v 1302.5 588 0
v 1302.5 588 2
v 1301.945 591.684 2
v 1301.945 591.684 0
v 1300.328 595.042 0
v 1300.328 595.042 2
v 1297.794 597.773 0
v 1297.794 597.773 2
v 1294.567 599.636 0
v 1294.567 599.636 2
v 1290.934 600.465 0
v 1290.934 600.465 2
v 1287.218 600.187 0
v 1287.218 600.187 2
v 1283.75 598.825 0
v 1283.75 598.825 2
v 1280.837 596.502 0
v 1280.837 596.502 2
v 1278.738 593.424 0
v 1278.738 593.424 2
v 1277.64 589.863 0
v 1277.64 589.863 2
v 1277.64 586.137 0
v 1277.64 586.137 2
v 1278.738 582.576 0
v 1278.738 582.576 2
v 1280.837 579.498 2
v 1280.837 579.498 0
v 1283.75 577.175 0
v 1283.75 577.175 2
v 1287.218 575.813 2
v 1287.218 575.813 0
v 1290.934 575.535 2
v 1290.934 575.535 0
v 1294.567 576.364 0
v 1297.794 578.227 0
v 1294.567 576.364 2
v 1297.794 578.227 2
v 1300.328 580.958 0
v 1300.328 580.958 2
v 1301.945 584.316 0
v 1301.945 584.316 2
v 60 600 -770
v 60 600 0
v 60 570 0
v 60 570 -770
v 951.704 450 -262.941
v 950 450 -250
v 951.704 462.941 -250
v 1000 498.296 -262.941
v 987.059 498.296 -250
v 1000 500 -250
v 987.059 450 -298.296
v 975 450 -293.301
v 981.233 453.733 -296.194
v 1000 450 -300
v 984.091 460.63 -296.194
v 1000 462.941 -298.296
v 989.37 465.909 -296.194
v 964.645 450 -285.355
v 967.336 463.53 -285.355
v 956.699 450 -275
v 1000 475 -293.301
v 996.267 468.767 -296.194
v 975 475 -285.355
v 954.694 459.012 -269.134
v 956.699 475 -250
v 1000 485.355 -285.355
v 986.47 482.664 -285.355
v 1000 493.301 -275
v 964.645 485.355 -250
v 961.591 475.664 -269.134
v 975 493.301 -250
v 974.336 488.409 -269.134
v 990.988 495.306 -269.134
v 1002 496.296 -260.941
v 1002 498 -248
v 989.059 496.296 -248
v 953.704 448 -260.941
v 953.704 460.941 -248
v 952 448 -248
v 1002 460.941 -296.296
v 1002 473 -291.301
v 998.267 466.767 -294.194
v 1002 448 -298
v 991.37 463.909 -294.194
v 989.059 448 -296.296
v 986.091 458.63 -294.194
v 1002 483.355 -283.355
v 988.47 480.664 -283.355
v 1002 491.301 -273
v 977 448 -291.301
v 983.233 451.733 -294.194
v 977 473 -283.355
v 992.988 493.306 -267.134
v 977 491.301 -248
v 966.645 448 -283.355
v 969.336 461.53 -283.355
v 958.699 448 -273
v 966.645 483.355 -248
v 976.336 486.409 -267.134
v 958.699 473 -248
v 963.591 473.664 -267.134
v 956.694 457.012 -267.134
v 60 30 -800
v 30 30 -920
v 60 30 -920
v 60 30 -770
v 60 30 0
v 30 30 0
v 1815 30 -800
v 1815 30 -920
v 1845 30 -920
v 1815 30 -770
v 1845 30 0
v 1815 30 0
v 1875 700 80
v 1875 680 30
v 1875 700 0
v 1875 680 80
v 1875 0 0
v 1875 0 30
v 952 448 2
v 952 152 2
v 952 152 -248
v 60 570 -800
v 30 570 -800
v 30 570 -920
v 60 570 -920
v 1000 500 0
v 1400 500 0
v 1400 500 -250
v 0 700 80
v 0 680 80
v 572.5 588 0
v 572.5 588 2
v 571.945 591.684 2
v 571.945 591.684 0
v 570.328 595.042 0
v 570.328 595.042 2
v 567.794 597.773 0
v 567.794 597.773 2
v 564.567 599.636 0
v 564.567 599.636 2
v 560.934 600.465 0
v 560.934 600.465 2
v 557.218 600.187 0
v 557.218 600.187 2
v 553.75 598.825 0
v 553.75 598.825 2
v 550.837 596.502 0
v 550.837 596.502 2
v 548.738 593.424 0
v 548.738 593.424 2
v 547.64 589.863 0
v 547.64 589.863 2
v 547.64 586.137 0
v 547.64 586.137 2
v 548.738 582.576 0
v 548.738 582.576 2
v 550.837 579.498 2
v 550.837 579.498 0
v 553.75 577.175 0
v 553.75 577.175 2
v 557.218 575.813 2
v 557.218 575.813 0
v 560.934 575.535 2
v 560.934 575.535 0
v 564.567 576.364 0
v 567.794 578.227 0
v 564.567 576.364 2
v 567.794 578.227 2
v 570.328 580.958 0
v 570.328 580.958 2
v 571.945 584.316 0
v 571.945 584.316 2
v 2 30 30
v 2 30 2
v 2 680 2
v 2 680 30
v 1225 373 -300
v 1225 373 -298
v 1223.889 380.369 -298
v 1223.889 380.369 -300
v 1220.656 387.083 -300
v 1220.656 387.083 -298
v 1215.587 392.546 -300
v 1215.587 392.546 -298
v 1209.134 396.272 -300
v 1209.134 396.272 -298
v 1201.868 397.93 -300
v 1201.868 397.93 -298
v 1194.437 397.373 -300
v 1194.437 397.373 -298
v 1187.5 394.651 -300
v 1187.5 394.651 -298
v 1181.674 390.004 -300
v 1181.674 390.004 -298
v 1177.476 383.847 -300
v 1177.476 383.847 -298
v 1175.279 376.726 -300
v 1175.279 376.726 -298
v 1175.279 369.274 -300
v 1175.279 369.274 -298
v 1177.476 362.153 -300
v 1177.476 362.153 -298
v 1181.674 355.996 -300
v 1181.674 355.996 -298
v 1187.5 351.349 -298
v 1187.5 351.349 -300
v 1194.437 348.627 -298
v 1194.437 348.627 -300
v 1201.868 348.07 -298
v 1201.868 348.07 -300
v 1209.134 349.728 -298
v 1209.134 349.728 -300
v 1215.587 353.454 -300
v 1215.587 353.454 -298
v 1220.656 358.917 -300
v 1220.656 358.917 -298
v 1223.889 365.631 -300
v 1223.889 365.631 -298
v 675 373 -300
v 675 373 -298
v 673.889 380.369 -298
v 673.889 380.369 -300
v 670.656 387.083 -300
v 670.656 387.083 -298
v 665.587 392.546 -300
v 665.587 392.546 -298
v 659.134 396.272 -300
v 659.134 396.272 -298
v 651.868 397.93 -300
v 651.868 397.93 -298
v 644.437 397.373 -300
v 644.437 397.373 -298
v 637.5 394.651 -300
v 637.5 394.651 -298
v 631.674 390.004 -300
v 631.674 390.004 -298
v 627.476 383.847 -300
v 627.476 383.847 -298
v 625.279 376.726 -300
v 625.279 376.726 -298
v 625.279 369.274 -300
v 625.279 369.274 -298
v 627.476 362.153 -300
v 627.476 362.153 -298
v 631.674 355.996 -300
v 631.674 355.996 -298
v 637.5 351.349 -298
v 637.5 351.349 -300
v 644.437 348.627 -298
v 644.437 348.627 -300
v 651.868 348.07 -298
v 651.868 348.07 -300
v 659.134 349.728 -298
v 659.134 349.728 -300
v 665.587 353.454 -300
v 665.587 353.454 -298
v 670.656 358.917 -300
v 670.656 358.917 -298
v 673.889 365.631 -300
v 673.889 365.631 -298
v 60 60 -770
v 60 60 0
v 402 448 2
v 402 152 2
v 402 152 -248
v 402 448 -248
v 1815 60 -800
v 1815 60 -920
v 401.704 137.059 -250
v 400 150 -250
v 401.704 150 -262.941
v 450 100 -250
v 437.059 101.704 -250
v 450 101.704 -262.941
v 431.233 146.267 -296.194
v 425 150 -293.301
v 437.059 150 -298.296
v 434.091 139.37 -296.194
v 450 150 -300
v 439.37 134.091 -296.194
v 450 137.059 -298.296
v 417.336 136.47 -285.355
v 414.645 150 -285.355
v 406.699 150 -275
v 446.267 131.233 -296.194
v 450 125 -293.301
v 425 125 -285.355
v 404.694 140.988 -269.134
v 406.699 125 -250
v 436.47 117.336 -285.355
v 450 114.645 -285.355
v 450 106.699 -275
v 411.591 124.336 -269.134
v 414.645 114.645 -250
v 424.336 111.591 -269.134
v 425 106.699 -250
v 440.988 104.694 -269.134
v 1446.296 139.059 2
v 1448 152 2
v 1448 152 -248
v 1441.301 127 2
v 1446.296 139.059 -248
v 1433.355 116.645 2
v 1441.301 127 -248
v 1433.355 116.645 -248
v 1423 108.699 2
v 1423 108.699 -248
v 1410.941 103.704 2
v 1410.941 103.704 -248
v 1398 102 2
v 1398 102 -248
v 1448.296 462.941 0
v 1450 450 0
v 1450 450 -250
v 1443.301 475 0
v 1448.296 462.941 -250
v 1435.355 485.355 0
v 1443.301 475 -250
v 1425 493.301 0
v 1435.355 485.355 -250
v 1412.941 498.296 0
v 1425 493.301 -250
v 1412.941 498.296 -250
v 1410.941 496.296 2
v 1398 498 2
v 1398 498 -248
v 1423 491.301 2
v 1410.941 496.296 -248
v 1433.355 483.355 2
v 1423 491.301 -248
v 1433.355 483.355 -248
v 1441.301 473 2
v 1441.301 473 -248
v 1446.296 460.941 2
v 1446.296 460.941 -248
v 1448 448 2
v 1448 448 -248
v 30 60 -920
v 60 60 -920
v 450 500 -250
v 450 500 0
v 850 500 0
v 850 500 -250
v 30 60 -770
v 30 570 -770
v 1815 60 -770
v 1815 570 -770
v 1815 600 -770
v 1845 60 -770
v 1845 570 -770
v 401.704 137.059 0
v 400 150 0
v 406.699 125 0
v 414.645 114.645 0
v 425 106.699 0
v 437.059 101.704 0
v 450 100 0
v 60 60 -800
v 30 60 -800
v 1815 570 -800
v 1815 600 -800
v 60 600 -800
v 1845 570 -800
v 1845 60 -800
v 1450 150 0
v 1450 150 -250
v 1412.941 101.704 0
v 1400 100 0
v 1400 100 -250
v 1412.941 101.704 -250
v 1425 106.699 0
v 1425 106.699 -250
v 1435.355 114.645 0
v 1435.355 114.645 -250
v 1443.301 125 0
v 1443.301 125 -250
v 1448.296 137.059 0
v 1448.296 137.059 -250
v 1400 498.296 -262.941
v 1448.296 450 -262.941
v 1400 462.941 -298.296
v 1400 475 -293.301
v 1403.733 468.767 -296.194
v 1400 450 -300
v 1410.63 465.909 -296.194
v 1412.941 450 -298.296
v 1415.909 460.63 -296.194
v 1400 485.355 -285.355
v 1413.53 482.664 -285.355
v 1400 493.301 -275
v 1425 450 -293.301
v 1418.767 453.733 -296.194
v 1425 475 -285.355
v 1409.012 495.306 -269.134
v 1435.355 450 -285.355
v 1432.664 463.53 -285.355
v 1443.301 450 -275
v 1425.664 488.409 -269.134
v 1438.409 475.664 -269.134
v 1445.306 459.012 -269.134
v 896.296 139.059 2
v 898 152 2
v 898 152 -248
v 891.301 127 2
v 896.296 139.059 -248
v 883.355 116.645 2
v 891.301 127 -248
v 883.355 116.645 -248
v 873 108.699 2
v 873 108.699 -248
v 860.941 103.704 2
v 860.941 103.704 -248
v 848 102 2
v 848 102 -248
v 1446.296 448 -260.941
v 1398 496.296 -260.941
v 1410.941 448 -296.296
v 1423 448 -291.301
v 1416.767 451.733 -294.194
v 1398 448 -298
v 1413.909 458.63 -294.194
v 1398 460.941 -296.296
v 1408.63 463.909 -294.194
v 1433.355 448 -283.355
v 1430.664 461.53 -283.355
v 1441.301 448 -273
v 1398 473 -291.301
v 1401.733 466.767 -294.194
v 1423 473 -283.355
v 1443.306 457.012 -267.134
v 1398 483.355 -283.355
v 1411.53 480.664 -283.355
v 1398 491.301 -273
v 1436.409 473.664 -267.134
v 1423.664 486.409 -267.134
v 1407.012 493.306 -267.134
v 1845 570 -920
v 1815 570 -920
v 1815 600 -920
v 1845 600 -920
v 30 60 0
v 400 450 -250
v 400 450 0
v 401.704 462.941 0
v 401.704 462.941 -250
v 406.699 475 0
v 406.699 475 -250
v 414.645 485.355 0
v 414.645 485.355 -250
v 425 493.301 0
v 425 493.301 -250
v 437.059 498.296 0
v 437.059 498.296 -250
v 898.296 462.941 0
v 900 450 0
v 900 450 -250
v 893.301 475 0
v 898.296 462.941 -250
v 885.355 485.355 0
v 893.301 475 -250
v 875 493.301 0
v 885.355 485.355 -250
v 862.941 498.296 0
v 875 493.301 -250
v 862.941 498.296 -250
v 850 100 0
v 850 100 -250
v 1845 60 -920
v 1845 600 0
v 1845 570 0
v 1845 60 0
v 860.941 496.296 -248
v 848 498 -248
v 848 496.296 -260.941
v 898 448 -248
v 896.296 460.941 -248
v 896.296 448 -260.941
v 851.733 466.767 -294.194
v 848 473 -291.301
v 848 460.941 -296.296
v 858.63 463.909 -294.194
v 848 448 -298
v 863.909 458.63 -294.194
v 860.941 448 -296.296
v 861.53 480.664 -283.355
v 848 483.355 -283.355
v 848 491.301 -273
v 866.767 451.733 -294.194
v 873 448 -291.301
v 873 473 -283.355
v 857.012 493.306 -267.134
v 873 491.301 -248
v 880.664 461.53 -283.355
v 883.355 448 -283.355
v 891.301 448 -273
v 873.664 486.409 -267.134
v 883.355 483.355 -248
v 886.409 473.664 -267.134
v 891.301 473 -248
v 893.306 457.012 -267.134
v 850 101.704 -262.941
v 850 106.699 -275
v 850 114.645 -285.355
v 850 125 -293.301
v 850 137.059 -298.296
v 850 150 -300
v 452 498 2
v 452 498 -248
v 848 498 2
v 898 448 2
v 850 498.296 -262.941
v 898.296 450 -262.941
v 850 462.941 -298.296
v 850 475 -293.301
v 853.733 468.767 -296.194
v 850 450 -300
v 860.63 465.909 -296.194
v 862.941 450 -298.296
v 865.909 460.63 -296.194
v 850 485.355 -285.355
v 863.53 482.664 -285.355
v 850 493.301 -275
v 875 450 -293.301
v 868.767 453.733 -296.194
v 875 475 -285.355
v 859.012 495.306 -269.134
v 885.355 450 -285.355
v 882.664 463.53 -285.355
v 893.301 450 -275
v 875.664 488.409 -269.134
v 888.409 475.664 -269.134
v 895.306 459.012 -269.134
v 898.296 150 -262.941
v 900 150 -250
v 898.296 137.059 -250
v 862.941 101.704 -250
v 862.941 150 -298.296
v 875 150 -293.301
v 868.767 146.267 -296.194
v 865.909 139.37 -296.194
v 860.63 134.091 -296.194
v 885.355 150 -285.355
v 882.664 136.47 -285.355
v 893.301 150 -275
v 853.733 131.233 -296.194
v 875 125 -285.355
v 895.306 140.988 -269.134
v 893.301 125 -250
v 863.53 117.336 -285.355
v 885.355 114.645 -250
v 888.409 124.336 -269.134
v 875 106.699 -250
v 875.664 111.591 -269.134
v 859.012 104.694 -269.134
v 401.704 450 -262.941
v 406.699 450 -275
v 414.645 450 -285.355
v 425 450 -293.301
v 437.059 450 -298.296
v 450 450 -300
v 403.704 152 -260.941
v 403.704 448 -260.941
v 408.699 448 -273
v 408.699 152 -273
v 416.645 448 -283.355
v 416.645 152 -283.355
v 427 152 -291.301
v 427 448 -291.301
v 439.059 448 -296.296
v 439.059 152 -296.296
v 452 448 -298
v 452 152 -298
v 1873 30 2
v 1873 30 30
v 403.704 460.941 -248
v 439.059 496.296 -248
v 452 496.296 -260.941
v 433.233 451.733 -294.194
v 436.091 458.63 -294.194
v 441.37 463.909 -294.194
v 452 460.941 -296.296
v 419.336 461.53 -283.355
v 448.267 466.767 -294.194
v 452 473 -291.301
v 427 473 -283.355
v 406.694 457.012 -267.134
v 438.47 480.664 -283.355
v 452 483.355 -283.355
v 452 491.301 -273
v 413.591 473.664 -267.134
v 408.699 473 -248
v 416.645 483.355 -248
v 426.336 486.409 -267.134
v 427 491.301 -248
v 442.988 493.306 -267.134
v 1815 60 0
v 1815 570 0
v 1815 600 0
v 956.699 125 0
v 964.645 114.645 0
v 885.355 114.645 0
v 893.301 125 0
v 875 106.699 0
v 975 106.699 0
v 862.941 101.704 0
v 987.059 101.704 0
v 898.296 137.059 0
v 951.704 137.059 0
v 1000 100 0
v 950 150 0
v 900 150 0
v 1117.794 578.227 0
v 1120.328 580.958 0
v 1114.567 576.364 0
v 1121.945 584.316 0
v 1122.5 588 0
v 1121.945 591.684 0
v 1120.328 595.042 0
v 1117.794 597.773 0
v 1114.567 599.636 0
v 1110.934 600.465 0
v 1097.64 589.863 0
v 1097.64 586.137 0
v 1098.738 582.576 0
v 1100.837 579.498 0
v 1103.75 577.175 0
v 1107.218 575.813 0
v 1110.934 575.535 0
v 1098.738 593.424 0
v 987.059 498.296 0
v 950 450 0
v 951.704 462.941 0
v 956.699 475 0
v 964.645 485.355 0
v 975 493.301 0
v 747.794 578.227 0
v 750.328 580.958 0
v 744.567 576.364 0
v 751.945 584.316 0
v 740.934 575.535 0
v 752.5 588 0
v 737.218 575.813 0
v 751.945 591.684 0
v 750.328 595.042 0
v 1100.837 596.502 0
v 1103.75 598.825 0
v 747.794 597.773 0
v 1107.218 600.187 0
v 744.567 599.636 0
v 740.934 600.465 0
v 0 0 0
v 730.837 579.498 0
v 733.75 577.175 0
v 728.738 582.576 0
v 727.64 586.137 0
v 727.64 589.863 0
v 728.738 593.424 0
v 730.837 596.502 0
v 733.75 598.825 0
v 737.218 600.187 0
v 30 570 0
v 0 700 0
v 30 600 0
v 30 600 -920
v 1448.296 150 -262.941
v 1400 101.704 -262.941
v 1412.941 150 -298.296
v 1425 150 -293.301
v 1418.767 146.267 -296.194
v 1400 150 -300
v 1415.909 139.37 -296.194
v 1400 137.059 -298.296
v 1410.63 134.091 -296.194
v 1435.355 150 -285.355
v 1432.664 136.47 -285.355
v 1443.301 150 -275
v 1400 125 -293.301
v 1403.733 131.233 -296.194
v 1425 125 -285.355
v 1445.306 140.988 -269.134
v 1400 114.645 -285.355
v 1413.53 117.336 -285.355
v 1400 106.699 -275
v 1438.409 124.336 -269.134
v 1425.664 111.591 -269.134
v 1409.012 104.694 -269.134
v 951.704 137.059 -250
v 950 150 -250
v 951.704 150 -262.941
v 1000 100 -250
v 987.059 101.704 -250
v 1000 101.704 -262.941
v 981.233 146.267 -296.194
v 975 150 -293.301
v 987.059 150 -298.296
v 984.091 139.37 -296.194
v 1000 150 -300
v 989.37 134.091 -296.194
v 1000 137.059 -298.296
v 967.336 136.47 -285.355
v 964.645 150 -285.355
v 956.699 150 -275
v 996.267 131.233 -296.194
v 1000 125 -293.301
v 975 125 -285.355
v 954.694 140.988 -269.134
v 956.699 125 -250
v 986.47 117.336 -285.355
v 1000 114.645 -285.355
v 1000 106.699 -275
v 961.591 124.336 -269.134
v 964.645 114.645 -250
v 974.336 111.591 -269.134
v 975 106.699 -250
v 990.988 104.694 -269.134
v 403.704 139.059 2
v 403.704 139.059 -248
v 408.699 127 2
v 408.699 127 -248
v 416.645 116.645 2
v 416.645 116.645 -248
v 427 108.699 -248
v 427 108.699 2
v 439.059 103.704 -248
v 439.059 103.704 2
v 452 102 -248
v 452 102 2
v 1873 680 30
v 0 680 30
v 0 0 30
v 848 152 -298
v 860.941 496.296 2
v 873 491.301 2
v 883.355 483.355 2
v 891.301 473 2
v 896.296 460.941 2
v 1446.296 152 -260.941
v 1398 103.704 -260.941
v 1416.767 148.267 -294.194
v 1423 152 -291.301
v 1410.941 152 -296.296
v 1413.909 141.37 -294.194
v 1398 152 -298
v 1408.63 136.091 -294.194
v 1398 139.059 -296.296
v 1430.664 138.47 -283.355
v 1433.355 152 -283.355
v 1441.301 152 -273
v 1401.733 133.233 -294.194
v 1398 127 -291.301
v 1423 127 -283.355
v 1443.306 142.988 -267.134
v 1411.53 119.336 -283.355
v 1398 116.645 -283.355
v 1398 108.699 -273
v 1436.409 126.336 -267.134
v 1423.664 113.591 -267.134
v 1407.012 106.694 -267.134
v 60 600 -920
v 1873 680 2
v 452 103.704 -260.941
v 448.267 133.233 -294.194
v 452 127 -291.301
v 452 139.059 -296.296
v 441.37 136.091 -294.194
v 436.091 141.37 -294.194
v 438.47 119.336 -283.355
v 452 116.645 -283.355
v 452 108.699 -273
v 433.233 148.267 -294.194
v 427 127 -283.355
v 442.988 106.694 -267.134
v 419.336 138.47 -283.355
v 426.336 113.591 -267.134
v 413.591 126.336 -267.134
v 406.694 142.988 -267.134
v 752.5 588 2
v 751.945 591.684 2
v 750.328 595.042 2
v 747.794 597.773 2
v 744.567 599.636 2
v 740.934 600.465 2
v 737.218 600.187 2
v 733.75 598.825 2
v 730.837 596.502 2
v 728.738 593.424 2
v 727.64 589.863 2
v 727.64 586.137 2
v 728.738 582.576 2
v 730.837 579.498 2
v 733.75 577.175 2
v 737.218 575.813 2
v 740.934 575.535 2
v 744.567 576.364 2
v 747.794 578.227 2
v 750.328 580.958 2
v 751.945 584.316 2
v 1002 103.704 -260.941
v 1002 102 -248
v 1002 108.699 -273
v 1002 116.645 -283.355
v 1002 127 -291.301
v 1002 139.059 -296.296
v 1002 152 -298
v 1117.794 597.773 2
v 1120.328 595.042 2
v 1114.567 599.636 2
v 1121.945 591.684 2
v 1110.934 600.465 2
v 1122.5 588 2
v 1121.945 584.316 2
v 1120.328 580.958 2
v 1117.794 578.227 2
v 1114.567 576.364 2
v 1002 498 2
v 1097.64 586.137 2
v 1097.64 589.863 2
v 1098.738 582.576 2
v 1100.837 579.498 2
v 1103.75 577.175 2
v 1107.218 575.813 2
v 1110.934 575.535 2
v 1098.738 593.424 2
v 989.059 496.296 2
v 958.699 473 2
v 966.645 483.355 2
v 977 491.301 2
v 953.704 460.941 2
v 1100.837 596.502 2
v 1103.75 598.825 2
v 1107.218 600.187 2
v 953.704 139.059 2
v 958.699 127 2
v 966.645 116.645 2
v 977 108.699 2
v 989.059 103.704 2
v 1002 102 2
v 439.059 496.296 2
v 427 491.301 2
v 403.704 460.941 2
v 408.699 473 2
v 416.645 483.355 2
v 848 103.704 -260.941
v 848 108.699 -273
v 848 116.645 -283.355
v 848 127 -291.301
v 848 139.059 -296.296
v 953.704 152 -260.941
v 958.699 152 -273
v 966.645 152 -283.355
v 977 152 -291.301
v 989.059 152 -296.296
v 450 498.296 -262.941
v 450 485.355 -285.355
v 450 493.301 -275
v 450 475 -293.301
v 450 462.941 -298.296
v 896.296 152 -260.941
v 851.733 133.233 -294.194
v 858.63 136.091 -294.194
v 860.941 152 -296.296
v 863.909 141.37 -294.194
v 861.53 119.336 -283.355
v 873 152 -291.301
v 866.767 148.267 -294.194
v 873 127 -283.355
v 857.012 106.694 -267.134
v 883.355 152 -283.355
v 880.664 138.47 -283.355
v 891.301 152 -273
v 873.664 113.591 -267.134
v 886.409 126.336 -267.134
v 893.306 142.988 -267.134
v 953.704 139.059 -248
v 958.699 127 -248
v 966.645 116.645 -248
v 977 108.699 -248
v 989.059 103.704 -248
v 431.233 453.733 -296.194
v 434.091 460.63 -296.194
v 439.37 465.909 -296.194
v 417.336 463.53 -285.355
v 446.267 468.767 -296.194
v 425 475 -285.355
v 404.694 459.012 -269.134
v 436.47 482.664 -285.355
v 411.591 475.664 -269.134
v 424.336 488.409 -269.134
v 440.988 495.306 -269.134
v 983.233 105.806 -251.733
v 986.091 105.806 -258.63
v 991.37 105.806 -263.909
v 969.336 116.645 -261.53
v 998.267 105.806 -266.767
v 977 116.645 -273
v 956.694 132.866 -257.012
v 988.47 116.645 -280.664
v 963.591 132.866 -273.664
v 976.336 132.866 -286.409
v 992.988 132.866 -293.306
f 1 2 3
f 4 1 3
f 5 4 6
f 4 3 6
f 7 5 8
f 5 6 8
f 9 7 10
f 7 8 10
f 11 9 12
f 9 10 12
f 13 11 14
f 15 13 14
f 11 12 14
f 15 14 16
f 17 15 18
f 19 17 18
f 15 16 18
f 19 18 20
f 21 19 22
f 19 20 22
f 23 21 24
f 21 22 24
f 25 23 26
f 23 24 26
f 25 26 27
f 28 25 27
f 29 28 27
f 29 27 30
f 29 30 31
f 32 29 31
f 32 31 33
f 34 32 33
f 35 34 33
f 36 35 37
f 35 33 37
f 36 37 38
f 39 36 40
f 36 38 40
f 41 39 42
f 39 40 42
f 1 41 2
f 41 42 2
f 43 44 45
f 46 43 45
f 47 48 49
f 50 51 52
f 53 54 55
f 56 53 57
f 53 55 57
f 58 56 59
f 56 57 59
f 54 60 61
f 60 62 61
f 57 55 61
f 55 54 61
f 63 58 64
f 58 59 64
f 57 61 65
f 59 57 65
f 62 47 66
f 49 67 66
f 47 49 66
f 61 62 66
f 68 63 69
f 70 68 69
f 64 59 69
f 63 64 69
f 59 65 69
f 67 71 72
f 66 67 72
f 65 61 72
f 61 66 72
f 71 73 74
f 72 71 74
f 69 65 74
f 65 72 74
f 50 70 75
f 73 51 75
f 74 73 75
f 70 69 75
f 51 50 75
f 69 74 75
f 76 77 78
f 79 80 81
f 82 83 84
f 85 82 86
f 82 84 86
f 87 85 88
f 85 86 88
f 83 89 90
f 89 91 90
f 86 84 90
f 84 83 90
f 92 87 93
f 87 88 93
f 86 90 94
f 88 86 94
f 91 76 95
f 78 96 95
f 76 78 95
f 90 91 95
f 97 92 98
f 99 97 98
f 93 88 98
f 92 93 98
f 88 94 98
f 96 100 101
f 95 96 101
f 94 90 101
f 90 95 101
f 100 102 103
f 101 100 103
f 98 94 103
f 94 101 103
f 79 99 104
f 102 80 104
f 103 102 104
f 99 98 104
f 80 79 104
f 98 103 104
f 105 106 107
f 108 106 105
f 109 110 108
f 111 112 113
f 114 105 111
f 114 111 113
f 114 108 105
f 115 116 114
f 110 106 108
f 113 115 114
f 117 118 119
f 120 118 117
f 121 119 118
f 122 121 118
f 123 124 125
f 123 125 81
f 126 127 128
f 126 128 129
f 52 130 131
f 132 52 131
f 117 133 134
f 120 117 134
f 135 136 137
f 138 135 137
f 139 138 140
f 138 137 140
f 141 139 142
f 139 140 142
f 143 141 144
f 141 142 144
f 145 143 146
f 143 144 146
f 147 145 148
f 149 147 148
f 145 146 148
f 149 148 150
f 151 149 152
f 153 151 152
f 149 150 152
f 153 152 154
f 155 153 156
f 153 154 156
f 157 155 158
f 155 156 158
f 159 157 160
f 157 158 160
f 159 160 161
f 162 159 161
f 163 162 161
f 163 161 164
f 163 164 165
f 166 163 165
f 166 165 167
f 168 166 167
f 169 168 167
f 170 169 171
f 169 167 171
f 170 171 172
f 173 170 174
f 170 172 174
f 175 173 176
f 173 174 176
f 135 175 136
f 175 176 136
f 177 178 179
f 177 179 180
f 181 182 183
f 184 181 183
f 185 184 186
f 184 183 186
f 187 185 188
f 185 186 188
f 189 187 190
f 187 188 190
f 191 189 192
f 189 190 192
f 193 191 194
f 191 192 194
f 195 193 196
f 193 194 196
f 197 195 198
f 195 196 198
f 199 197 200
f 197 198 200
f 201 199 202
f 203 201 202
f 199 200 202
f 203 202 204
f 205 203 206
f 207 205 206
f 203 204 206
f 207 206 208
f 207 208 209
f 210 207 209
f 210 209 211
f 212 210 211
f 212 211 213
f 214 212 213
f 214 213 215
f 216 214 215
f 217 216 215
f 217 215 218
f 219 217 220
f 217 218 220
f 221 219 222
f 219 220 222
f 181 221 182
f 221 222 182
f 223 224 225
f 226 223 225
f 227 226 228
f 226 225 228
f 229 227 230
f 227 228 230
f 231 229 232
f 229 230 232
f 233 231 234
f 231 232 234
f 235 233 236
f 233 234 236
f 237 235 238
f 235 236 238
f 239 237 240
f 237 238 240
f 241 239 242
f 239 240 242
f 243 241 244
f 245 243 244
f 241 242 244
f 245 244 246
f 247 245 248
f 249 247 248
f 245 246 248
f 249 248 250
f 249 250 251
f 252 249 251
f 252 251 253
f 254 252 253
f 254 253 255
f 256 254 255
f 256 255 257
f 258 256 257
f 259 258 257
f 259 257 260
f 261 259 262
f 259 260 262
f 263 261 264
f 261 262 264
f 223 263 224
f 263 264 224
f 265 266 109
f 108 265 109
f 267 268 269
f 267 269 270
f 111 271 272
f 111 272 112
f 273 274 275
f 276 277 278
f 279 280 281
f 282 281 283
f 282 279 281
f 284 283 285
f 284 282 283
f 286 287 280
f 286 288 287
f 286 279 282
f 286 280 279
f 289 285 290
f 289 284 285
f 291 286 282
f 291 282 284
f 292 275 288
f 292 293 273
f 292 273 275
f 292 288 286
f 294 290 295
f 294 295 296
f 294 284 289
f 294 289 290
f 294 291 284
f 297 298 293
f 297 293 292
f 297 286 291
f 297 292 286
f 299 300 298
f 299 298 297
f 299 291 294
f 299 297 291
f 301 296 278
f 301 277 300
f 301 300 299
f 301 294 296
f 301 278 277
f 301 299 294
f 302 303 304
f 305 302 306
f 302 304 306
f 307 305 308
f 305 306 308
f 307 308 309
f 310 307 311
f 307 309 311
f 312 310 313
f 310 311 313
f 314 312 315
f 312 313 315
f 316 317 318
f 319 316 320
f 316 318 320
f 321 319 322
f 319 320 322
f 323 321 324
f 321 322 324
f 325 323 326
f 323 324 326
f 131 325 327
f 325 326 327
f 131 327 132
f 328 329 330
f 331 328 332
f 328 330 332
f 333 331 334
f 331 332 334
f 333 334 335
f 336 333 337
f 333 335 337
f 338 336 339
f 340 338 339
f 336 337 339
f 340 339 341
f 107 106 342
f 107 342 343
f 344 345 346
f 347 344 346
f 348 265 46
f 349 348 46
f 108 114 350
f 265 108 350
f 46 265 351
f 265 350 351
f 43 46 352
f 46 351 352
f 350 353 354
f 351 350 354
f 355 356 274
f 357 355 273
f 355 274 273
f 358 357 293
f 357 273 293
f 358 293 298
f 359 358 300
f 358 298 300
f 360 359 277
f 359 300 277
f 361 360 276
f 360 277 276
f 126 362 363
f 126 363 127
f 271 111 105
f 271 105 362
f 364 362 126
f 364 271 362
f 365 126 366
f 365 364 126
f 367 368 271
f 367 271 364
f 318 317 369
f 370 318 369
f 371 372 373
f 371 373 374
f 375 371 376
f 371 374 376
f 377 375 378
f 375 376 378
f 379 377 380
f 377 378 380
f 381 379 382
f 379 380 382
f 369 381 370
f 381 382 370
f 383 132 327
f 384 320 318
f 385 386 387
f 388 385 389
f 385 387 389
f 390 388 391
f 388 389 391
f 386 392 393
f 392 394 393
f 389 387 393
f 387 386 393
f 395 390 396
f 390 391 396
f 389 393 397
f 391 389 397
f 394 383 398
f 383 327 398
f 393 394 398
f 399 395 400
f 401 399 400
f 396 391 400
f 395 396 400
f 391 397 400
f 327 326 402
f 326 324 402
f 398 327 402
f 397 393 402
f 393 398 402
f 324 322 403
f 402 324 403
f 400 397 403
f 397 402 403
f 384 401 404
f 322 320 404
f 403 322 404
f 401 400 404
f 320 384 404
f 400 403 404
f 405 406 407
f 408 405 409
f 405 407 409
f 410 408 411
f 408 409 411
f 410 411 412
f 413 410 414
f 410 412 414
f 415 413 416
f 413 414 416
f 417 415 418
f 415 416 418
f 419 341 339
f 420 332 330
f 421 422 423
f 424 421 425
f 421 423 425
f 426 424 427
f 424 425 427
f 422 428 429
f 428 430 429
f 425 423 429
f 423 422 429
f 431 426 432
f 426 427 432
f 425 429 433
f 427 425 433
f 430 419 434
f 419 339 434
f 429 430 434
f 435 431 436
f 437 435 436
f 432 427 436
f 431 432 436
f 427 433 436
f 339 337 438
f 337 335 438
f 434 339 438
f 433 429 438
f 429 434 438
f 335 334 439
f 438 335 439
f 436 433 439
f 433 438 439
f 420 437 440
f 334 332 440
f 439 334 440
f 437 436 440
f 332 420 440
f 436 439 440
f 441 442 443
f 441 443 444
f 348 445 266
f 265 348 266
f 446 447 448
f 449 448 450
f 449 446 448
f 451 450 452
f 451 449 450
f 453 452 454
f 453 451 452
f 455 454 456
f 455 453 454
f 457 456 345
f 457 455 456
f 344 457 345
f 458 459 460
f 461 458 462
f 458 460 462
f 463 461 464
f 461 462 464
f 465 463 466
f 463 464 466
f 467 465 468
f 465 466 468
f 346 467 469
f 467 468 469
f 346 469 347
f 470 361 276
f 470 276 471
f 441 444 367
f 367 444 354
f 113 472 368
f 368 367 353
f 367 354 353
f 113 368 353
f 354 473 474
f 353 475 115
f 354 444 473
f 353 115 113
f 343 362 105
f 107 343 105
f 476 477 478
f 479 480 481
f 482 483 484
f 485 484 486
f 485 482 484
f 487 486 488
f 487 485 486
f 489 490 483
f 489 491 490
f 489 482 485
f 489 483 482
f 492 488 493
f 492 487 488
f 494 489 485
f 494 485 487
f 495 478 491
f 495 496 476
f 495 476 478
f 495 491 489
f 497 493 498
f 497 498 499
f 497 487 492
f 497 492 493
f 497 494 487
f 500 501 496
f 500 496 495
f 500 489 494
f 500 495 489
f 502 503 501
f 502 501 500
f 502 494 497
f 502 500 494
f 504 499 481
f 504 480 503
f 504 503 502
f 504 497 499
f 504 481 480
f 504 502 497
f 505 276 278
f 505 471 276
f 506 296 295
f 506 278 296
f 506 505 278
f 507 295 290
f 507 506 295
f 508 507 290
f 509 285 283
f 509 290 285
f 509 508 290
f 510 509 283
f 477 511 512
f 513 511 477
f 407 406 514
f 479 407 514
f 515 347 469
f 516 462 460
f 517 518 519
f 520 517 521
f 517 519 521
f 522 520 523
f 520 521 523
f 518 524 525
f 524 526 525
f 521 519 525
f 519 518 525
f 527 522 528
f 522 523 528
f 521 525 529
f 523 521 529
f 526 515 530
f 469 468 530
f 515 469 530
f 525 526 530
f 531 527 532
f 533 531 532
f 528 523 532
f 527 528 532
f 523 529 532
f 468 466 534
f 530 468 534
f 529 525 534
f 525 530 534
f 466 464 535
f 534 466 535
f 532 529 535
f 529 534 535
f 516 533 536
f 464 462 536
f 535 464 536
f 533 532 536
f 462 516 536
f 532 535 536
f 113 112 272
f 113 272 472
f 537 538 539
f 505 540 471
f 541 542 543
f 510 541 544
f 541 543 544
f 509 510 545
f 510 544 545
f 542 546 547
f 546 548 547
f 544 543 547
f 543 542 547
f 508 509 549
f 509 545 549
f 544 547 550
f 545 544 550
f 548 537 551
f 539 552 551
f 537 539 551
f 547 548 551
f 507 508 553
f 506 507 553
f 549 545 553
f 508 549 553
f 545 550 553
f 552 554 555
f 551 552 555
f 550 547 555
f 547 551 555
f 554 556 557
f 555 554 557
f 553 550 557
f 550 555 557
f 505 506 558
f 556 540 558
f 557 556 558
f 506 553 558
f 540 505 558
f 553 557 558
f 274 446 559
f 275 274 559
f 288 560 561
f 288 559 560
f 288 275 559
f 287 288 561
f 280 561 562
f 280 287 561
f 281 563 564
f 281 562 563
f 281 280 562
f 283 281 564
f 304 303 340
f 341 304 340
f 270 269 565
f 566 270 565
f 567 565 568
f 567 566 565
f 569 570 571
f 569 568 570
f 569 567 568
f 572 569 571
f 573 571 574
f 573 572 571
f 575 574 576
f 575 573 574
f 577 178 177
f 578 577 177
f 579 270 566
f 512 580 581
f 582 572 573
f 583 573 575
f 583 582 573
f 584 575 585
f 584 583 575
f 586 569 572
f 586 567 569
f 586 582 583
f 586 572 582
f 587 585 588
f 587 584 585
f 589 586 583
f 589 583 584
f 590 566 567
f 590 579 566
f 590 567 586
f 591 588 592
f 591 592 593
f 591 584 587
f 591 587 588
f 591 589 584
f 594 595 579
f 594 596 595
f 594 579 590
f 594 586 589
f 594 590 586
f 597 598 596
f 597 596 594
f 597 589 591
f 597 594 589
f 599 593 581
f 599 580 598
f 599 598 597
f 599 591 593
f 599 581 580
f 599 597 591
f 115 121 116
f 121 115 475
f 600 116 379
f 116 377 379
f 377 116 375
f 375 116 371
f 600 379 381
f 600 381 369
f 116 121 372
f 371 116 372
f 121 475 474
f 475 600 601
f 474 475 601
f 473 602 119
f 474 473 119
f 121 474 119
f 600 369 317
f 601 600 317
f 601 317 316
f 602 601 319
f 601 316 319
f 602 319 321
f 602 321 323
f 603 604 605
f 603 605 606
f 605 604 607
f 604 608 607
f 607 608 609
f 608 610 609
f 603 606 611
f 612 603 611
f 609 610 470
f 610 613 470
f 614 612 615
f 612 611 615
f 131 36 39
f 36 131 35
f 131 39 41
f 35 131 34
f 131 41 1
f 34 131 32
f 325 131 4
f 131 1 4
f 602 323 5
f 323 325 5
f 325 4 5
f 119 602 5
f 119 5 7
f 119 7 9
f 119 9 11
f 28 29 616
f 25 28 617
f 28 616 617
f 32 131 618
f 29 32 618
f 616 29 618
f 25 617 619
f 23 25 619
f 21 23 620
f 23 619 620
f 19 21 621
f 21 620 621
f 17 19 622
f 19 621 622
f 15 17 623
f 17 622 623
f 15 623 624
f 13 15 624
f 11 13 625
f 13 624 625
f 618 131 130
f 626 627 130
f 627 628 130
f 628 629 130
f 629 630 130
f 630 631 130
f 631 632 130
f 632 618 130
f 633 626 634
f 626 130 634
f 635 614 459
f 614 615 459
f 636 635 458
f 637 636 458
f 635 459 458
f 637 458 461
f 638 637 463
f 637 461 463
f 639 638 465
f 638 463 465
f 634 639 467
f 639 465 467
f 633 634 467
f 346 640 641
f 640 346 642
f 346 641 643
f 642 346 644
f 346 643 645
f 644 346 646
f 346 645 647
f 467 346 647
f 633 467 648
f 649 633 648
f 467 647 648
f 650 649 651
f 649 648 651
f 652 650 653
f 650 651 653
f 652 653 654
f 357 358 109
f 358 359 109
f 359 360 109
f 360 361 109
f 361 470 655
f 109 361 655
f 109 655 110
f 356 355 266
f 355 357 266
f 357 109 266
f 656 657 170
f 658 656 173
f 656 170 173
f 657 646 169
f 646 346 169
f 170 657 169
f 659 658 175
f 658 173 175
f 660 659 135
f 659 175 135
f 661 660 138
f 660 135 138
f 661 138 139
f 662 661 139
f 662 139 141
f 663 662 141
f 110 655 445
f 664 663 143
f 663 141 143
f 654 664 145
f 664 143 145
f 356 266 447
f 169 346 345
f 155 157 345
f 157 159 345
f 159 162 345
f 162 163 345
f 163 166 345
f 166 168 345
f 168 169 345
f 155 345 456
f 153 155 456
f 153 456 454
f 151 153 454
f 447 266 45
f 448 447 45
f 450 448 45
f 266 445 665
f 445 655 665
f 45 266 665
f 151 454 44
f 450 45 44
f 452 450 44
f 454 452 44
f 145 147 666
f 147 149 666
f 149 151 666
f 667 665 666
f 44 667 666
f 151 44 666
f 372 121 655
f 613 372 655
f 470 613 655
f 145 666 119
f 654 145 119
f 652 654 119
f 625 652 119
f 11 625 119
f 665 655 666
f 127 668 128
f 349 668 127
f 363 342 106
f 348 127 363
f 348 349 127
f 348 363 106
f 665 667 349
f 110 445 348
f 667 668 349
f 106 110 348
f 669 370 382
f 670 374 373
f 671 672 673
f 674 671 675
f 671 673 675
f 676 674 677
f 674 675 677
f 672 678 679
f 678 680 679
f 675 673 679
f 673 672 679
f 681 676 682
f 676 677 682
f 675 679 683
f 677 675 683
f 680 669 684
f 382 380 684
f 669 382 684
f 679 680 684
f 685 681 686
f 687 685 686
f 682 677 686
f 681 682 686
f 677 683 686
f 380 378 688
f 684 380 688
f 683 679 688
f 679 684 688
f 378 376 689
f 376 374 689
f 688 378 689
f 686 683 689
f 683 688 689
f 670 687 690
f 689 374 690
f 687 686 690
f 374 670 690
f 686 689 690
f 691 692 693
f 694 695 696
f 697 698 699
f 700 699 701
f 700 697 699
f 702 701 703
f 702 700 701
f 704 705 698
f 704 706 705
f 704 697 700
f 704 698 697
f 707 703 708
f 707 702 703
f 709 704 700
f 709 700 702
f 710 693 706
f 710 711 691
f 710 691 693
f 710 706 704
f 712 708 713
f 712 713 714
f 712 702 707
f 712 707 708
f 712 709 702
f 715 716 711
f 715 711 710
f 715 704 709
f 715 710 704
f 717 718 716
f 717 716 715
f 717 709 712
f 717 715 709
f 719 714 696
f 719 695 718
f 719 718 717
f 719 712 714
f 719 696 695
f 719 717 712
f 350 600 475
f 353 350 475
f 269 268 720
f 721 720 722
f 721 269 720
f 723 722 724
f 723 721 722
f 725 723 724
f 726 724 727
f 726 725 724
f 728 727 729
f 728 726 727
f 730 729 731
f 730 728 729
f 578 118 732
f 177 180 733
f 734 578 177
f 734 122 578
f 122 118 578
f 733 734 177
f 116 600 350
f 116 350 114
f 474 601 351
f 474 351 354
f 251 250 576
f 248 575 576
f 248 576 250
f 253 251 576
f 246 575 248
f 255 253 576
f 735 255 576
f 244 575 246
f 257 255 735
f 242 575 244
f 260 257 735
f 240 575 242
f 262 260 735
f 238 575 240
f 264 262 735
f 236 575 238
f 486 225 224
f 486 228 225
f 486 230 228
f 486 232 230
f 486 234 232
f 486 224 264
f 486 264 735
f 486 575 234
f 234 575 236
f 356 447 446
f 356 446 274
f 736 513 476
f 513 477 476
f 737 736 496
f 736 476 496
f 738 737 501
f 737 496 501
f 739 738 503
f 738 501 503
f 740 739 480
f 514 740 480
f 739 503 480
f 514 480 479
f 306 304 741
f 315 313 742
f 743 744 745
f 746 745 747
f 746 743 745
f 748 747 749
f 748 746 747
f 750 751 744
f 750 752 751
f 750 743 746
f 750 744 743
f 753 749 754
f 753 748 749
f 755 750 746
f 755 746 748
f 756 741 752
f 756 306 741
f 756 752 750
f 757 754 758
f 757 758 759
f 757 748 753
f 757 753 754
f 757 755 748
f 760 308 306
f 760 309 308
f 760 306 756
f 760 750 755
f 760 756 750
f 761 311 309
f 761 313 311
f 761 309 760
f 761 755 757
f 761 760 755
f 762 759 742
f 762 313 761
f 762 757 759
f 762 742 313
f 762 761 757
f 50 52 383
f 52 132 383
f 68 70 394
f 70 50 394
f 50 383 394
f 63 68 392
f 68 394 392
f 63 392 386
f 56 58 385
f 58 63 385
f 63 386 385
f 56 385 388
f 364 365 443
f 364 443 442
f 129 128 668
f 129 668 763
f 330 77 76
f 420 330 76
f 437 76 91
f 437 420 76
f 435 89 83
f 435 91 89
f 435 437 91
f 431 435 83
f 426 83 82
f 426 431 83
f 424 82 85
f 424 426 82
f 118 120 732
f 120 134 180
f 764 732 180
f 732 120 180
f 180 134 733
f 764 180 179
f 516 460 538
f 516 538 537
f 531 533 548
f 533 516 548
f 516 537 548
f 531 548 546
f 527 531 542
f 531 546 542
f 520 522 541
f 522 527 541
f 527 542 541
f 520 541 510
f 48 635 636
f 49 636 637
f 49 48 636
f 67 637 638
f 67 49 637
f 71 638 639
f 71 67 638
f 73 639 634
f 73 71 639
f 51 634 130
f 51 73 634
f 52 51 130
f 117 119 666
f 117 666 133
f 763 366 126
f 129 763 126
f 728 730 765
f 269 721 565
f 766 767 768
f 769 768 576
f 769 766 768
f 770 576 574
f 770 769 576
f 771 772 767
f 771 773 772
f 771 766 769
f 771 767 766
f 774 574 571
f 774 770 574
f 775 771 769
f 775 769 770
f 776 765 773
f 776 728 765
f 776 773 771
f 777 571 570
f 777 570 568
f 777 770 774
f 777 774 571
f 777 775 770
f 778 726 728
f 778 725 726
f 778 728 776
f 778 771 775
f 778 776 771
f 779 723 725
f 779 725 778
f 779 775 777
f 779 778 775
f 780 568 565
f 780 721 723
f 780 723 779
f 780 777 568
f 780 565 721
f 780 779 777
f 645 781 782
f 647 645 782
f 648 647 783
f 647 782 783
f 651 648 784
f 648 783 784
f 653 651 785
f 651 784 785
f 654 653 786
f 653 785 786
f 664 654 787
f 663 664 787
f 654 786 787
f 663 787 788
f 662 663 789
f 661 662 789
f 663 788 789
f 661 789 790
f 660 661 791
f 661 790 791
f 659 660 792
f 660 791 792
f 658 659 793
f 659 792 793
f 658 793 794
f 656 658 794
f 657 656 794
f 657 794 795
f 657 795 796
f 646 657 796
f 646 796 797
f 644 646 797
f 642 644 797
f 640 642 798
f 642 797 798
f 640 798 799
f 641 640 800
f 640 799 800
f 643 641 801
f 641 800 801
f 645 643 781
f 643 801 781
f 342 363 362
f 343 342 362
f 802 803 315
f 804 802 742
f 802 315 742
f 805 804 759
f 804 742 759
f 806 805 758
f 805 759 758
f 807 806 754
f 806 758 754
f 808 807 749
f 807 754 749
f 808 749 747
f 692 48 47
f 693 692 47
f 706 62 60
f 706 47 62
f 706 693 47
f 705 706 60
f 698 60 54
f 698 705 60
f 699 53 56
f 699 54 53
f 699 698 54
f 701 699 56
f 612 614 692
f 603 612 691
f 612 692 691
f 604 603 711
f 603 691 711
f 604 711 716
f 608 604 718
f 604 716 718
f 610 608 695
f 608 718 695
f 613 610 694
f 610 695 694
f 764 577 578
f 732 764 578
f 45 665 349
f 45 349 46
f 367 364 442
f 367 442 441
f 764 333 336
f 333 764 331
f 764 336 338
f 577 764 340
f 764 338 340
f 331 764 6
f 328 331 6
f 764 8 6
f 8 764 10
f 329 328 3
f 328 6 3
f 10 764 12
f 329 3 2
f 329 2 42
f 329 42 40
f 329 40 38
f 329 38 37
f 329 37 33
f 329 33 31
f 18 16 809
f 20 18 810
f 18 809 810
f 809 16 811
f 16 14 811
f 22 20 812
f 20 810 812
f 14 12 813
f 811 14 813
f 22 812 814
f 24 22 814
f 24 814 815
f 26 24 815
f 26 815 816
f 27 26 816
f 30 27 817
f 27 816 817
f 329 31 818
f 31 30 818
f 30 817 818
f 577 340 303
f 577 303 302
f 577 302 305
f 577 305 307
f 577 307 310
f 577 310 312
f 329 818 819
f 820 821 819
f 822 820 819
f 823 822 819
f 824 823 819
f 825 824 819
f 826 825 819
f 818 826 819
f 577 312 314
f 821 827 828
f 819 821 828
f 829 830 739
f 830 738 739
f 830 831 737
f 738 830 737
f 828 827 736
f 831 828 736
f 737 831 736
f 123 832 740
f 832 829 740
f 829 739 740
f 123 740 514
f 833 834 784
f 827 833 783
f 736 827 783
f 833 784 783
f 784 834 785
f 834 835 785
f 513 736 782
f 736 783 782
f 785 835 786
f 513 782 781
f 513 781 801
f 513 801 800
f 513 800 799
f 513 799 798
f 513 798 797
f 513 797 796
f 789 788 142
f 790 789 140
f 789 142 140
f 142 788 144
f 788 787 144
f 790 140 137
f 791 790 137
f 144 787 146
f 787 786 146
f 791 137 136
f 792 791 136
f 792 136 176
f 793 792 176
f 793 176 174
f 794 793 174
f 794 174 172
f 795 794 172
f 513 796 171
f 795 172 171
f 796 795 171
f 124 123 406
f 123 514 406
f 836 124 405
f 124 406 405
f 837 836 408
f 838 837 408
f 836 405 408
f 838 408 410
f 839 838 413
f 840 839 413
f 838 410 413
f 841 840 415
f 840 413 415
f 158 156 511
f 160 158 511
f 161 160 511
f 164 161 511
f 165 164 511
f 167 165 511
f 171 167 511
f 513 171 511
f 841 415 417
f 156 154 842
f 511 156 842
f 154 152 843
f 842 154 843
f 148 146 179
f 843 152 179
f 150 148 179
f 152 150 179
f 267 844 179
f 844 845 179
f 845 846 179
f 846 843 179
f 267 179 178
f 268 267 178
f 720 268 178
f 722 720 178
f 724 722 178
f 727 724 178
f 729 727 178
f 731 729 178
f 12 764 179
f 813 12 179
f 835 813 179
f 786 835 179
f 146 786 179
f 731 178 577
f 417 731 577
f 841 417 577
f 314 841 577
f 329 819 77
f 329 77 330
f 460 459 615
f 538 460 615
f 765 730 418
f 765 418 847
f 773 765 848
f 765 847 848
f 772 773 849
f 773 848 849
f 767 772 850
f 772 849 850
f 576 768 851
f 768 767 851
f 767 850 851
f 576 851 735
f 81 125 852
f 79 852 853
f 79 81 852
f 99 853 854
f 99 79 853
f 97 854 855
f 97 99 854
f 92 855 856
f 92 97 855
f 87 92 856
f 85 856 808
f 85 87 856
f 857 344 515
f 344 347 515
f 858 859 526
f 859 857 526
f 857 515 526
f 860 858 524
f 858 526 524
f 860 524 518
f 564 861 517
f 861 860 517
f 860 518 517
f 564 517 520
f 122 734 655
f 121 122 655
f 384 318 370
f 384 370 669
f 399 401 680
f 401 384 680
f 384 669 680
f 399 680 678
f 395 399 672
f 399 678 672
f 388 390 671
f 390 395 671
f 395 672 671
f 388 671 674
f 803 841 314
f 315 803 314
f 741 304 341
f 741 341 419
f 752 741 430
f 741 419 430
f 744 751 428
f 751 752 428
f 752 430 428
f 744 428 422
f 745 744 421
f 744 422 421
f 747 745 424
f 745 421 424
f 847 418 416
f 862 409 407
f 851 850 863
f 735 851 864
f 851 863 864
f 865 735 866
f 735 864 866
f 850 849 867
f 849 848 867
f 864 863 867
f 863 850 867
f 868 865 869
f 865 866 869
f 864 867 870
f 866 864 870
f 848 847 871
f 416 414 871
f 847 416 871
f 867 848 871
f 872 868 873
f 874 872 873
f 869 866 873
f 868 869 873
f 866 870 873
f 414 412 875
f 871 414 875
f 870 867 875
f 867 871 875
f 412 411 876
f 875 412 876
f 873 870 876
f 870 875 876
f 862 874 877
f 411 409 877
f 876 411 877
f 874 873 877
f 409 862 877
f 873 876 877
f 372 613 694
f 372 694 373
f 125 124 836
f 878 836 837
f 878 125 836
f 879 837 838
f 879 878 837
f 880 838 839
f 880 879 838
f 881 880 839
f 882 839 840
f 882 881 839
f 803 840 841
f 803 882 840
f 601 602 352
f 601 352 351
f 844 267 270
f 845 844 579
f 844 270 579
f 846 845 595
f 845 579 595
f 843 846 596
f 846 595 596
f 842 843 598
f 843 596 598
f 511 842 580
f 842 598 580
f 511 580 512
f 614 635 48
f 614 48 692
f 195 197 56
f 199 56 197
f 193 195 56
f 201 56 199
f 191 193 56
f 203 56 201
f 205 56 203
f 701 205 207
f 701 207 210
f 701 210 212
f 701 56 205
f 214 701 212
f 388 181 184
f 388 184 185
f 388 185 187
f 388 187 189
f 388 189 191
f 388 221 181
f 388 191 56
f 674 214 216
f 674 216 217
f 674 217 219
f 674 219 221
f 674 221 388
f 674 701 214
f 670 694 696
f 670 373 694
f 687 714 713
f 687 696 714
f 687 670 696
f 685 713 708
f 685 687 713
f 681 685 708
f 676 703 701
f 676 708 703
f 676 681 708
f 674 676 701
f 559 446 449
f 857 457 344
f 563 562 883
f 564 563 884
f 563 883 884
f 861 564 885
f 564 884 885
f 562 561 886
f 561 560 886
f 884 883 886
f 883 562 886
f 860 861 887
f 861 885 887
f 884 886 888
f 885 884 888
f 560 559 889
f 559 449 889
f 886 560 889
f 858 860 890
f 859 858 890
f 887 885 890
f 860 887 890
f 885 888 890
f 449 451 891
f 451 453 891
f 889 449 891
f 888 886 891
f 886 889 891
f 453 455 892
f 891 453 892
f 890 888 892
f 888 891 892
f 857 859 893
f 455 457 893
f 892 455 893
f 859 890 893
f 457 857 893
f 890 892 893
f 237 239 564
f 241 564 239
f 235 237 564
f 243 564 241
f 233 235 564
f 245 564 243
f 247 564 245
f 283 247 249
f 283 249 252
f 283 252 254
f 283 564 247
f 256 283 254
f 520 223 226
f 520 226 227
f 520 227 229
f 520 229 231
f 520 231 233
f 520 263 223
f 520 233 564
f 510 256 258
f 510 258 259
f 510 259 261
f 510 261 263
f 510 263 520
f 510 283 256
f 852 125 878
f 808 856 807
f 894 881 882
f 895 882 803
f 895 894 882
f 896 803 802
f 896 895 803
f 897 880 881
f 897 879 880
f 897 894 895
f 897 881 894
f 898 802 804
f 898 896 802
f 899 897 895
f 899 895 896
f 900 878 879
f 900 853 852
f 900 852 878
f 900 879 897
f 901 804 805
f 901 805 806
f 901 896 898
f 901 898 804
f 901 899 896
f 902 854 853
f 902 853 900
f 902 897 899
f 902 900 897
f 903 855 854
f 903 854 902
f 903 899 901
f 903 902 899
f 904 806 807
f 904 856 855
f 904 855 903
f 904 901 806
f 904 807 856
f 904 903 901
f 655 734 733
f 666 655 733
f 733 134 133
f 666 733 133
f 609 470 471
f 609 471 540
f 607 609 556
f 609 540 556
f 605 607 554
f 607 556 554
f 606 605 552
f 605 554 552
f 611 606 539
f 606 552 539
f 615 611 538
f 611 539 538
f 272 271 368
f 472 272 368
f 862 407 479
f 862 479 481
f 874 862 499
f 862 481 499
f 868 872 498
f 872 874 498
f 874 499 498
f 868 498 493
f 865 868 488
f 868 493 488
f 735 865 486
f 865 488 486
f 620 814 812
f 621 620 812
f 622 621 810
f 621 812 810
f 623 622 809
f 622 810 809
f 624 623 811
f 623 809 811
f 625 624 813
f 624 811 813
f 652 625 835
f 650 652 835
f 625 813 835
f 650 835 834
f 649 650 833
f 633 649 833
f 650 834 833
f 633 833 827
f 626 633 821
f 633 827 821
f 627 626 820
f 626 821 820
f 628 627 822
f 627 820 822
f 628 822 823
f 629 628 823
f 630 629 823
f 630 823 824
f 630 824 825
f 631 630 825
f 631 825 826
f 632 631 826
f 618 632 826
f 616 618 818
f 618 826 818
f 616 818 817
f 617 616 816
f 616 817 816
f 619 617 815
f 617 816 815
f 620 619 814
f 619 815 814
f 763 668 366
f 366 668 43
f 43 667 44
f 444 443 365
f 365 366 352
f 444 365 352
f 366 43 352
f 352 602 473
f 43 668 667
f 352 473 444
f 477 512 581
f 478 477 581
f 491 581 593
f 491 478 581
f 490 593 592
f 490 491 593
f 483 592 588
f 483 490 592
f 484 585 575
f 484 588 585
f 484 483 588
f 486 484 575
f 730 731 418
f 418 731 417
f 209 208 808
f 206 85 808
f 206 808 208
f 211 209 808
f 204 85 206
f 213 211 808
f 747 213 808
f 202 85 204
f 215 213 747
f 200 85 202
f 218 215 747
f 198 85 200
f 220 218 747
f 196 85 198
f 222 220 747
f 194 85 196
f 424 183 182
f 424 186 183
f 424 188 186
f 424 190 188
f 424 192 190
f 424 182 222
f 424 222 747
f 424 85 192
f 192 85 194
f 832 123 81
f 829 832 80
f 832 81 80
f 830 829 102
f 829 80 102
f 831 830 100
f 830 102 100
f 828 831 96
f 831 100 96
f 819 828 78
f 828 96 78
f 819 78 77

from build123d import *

# Parameters (mm, degrees)
F1_DEPTH  = 1875
F2_W      = 2
F2_H      = 28
F3_DEPTH  = 650
F4_W      = 500
F4_H      = 400
F5_DEPTH  = 300
F6_W      = 496
F6_H      = 396
F7_DEPTH  = 300
F8_R      = 50
F9_R      = 50
F10_R     = 25
F11_DEPTH = 2
F12_R     = 12.5
F13_DEPTH = 2
F14_W     = 30
F14_H     = 30
F15_DEPTH = 920
F16_W     = 570
F16_H     = 30
F17_DEPTH = 1815


with BuildPart() as f1:
    # F0 (on Right) → F1 (new body)
    with BuildSketch(Plane.YZ):
        Polygon((0, 30), (0, 0), (700, 0), (700, 80), (680, 80), (680, 2), (30, 2), (30, 30), align=None)
    extrude(amount=F1_DEPTH)

    # F2 (on face) → F3 (join, through all)
    with BuildSketch(Plane(origin=(0, 30, 0), x_dir=(-1, 0, 0), z_dir=(0, 1, 0))):
        with Locations((-1874, 16)):
            Rectangle(F2_W, F2_H)
        with Locations((-1, 16)):
            Rectangle(F2_W, F2_H)
    extrude(amount=F3_DEPTH)

    # F4 (on face) → F5 (join)
    with BuildSketch(Plane(origin=(0, 0, 0), x_dir=(1, 0, 0), z_dir=(0, 0, -1))):
        with Locations((650, -300)):
            Rectangle(F4_W, F4_H)
        with Locations((1200, -300)):
            Rectangle(F4_W, F4_H)
    extrude(amount=F5_DEPTH)

    # F6 (on face) → F7 (cut)
    with BuildSketch(Plane.XY.offset(2)):
        with Locations((650, 300)):
            Rectangle(F6_W, F6_H)
        with Locations((1200, 300)):
            Rectangle(F6_W, F6_H)
    extrude(amount=-F7_DEPTH, mode=Mode.SUBTRACT)

    # F8
    f8_edges = [f1.edges().sort_by_distance(p)[0] for p in [
        (402, 102, -148),
        (402, 498, -148),
        (952, 498, -148),
        (1448, 498, -148),
        (898, 498, -148),
        (898, 102, -148),
        (1448, 102, -148),
        (1448, 300, -298),
        (1200, 498, -298),
        (952, 300, -298),
        (952, 102, -148),
        (1200, 102, -298),
        (650, 102, -298),
        (402, 300, -298),
        (650, 498, -298),
        (898, 300, -298),
    ]]
    fillet(f8_edges, radius=F8_R)

    # F9
    f9_edges = [f1.edges().sort_by_distance(p)[0] for p in [
        (400, 100, -150),
        (900, 100, -150),
        (950, 100, -150),
        (1450, 100, -150),
        (1450, 500, -150),
        (950, 500, -150),
        (900, 500, -150),
        (400, 500, -150),
        (400, 300, -300),
        (650, 500, -300),
        (900, 300, -300),
        (650, 100, -300),
        (950, 300, -300),
        (1200, 500, -300),
        (1450, 300, -300),
        (1200, 100, -300),
    ]]
    fillet(f9_edges, radius=F9_R)

    # F10 (on face) → F11 (cut, through all)
    with BuildSketch(Plane.XY.offset(-298)):
        with Locations((650, 373)):
            Circle(F10_R)
        with Locations((1200, 373)):
            Circle(F10_R)
    extrude(amount=-F11_DEPTH, mode=Mode.SUBTRACT)

    # F12 (on face) → F13 (cut, through all)
    with BuildSketch(Plane.XY.offset(2)):
        with Locations((560, 588)):
            Circle(F12_R)
        with Locations((740, 588)):
            Circle(F12_R)
        with Locations((1110, 588)):
            Circle(F12_R)
        with Locations((1290, 588)):
            Circle(F12_R)
    extrude(amount=-F13_DEPTH, mode=Mode.SUBTRACT)

    # F14 (on face) → F15 (join)
    with BuildSketch(Plane(origin=(0, 0, 0), x_dir=(1, 0, 0), z_dir=(0, 0, -1))):
        with Locations((45, -45)):
            Rectangle(F14_W, F14_H)
        with Locations((1830, -45)):
            Rectangle(F14_W, F14_H)
        with Locations((1830, -585)):
            Rectangle(F14_W, F14_H)
        with Locations((45, -585)):
            Rectangle(F14_W, F14_H)
    extrude(amount=F15_DEPTH)

    # F16 (on face) → F17 (join, through all)
    with BuildSketch(Plane.YZ.offset(1845)):
        with Locations((315, -785)):
            Rectangle(F16_W, F16_H)
    extrude(amount=-F17_DEPTH)


solid = f1.part
